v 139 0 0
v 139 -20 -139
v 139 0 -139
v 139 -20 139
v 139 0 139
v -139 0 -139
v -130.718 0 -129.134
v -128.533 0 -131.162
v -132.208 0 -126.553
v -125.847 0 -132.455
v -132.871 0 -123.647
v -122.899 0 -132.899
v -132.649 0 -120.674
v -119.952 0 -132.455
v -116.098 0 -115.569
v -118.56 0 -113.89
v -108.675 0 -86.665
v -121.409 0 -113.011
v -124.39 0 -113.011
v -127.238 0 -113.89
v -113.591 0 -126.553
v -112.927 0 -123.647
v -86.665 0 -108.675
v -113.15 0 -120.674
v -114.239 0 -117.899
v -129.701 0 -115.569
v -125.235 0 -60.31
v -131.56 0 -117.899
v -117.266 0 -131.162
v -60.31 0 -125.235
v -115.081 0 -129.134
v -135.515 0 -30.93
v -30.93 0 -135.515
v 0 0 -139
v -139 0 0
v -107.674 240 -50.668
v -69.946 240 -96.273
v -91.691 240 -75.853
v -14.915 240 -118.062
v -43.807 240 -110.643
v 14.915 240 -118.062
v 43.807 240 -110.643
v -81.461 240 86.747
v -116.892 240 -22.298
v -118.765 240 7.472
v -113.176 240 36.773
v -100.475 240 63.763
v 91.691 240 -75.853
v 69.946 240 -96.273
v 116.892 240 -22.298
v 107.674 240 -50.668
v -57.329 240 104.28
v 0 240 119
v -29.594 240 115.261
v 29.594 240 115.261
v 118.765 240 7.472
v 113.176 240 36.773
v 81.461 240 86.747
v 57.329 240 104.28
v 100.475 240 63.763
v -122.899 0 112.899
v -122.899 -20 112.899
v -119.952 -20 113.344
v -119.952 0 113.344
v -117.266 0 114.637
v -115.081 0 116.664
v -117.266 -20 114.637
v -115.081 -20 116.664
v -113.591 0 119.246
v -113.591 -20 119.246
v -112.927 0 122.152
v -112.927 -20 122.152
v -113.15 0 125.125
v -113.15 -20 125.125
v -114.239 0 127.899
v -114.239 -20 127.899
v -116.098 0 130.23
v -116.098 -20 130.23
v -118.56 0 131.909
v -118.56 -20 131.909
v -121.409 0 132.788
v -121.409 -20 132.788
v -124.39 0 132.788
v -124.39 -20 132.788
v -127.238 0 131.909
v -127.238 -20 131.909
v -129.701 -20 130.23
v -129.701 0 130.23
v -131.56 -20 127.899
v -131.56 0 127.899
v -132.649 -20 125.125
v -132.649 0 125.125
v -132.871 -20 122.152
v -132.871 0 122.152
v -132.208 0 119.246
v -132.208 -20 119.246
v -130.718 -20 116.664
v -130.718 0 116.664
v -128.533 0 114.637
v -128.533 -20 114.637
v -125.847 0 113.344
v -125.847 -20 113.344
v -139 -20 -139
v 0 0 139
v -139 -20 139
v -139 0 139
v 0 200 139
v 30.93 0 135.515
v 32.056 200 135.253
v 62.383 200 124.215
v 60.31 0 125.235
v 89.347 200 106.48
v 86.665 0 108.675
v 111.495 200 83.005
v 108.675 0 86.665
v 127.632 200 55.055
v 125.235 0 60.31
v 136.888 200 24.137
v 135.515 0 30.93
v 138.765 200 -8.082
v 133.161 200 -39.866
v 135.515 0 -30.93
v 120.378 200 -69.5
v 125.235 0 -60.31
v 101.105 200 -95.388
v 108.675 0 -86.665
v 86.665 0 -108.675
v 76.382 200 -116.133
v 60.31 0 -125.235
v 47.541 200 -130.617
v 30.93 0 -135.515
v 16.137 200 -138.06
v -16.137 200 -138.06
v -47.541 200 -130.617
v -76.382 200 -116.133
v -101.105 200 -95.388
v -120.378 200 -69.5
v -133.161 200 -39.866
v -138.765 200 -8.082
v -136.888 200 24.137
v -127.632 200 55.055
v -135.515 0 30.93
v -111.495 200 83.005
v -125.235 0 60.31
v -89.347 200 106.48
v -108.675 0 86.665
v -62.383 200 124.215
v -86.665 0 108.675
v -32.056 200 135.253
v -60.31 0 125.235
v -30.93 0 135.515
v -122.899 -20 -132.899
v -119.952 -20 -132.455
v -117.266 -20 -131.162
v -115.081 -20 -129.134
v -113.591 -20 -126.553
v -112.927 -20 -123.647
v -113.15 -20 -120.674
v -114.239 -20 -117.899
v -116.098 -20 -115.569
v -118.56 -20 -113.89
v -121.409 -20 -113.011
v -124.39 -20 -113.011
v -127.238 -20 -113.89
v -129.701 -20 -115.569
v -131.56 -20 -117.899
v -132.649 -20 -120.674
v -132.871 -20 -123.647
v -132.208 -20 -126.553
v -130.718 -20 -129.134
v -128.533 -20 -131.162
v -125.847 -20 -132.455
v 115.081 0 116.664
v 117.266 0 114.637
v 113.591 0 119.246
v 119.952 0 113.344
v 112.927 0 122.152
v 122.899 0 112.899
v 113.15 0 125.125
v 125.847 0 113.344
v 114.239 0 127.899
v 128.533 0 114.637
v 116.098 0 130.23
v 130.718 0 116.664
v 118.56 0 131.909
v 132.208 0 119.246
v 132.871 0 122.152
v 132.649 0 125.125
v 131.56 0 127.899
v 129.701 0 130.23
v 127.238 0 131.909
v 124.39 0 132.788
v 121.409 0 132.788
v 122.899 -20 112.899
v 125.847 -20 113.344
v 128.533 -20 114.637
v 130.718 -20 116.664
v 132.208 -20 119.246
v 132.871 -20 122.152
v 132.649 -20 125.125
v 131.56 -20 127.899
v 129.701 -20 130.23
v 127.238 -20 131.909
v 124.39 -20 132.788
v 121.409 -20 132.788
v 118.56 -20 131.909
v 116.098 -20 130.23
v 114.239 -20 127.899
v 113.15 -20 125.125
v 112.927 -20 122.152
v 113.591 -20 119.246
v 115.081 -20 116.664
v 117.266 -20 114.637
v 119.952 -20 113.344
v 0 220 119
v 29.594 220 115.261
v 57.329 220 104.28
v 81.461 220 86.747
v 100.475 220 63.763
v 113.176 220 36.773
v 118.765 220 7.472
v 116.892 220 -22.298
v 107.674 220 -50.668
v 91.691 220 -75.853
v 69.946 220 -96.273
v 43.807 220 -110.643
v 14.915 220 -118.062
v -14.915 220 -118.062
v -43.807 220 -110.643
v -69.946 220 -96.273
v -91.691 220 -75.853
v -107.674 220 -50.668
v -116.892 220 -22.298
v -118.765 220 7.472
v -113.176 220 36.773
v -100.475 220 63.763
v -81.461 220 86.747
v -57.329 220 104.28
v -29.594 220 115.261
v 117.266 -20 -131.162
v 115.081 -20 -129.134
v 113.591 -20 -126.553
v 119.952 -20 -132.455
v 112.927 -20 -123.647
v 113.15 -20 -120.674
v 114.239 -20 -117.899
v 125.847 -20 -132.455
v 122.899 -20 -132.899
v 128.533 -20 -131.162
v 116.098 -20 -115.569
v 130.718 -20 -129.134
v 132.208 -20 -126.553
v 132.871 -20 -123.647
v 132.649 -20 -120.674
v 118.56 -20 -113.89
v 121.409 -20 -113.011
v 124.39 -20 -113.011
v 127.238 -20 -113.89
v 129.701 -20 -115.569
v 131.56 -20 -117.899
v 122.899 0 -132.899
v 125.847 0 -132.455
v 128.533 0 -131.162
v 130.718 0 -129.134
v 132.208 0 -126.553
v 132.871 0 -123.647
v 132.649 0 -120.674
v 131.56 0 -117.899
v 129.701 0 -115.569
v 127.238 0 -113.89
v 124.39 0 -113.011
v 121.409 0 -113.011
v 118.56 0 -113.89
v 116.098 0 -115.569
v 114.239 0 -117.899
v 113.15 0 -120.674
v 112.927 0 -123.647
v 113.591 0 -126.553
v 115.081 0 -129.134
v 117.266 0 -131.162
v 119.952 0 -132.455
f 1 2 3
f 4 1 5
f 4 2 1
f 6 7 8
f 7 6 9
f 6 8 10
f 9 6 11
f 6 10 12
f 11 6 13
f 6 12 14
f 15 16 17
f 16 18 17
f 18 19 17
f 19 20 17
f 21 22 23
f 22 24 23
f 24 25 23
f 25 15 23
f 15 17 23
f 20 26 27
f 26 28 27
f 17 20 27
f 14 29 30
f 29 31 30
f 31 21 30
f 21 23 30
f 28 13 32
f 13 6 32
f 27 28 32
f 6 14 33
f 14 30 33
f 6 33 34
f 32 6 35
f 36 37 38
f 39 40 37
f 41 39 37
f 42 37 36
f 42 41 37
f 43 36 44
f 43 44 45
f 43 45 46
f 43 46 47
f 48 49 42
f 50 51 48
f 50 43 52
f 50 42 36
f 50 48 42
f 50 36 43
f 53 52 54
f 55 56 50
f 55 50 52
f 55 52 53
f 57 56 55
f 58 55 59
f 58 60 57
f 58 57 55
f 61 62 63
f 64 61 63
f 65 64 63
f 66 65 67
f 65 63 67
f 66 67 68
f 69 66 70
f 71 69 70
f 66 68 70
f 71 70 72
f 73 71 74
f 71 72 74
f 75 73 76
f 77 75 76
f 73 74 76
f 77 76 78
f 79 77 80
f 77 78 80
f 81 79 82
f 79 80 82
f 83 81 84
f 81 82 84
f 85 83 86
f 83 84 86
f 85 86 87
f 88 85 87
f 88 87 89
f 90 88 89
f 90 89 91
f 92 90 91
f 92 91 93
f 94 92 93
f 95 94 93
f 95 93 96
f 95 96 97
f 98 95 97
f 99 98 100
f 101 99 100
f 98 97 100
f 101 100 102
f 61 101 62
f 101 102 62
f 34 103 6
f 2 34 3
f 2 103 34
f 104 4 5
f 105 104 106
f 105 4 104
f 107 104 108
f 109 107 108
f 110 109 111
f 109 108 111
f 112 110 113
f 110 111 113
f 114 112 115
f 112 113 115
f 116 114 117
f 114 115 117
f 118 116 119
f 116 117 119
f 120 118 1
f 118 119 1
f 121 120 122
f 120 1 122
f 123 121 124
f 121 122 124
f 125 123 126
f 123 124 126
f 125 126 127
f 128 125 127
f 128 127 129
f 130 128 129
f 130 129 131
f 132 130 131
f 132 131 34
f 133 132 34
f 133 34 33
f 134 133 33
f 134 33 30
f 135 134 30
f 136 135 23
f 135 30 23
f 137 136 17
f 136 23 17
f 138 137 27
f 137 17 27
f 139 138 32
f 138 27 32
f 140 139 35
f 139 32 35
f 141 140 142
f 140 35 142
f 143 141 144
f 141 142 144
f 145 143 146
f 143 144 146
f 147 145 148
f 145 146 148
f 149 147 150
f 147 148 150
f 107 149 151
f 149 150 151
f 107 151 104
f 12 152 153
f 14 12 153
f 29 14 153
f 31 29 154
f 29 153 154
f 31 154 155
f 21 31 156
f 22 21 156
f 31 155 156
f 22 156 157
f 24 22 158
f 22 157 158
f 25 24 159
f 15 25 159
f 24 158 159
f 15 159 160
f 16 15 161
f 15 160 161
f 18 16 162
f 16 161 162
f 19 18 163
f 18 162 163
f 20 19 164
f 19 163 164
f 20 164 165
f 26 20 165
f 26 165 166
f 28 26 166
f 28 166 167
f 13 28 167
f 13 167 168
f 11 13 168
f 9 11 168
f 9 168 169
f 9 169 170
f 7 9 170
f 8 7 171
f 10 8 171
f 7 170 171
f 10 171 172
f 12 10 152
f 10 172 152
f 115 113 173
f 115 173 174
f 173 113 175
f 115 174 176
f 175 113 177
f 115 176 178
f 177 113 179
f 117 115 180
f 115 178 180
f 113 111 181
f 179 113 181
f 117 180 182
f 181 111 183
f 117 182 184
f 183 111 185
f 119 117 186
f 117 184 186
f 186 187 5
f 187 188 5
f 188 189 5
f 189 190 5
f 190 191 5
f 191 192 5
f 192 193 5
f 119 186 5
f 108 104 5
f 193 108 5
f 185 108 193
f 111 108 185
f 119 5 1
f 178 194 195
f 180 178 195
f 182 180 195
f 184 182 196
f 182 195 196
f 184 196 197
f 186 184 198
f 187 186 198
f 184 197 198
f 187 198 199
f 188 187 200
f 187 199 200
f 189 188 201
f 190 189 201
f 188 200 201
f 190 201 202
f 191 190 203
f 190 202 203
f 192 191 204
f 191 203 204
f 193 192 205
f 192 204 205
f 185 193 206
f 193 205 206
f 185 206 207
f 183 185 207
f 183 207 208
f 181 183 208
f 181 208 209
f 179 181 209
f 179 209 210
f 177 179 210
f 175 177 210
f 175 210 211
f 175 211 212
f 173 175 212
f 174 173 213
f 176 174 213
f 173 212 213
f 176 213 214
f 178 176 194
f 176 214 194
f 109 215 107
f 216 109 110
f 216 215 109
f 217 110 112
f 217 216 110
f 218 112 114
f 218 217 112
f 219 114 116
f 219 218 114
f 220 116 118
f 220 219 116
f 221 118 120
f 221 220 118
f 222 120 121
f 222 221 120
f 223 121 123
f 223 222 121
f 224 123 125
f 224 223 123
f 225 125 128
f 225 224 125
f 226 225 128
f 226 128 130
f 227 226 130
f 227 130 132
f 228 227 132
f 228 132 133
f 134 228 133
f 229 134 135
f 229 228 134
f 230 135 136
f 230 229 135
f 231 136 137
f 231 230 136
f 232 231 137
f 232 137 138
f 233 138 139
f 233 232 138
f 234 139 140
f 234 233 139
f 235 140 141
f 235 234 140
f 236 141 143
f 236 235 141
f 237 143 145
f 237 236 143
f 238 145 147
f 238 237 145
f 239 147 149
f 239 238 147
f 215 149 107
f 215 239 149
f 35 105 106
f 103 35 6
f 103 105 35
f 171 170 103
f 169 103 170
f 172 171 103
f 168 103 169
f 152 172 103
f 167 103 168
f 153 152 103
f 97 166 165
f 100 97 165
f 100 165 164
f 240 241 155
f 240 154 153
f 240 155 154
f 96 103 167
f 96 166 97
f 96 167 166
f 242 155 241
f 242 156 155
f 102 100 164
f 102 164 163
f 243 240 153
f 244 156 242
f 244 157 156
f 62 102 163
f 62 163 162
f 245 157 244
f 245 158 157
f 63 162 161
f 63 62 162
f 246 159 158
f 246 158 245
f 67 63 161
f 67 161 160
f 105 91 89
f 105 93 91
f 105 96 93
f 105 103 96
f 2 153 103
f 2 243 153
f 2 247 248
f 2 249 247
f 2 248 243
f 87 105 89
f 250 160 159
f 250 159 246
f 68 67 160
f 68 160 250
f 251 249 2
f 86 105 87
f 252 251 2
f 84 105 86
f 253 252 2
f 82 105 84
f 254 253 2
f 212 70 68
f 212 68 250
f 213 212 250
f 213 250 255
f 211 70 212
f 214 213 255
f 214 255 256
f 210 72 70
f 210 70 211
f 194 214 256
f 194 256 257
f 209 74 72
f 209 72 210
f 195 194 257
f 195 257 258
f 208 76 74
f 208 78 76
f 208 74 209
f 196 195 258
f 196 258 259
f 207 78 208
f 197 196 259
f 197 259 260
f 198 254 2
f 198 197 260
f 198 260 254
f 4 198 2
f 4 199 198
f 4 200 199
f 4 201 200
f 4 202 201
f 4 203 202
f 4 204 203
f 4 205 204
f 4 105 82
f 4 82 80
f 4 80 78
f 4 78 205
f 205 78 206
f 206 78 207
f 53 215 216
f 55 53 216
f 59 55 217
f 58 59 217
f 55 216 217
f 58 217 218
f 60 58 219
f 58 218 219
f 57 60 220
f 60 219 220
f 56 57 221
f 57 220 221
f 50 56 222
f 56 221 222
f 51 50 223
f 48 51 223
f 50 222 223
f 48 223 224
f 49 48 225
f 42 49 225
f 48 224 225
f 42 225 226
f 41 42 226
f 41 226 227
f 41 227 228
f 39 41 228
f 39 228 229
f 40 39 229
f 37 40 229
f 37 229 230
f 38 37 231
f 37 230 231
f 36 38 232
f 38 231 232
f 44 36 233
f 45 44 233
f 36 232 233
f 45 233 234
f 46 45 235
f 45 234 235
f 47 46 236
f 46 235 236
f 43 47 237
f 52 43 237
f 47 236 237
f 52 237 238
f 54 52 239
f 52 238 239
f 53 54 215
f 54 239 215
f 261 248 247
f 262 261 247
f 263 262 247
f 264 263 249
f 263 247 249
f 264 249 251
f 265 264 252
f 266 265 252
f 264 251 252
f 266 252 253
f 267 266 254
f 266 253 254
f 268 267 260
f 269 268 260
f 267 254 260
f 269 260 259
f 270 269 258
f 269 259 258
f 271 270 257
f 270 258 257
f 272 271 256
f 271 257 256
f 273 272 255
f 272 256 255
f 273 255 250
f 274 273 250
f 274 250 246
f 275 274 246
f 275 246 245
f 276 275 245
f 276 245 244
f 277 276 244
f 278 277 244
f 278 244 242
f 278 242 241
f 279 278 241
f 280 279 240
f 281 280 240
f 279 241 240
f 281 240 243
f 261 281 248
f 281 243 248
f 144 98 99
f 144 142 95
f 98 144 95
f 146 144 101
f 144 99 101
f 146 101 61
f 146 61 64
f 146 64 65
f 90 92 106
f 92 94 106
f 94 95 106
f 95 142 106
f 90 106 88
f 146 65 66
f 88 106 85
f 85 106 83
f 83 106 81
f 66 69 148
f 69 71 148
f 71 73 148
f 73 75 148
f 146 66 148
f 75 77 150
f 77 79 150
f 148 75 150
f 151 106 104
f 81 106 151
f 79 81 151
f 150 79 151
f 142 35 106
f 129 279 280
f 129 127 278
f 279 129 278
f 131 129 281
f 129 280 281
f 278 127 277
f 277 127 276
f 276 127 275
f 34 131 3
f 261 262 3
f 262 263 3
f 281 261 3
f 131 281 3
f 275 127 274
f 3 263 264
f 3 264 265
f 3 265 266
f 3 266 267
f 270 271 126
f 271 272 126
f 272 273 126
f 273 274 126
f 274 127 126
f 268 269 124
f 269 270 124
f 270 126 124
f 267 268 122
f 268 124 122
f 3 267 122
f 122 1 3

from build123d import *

# Parameters (mm, degrees)
SKETCH1_R           = 139
BOSS_EXTRUDE5_DEPTH = 220
CHAMFER6_SIZE       = 20
SKETCH9_R           = 119
BOSS_EXTRUDE6_DEPTH = 20
BOSS_EXTRUDE7_START = 20
SKETCH10_R          = 10
BOSS_EXTRUDE7_DEPTH = 20


with BuildPart() as part:
    # Sketch1 → Boss-Extrude5 (new body)
    with BuildSketch(Plane(origin=(0, 0, 0), x_dir=(1, 0, 0), z_dir=(0, 1, 0))):
        with Locations(Location((0, 0, 0), (0, 0, 270))):
            Circle(SKETCH1_R)
    extrude(amount=BOSS_EXTRUDE5_DEPTH)

    # Chamfer6
    chamfer6_edges = [part.edges().sort_by_distance(p)[0] for p in [
        (0, 220, -139),
    ]]
    chamfer(chamfer6_edges, length=CHAMFER6_SIZE)

    # Sketch9 → Boss-Extrude6 (add)
    with BuildSketch(Plane(origin=(0, 220, 0), x_dir=(1, 0, 0), z_dir=(0, 1, 0))):
        with Locations(Location((0, 0, 0), (0, 0, 270))):
            Circle(SKETCH9_R)
    extrude(amount=BOSS_EXTRUDE6_DEPTH)

    # Sketch10 → Boss-Extrude7 (add)
    # profile 1 of 20: a face of its own
    with BuildSketch(Plane.XZ.offset(BOSS_EXTRUDE7_START)):
        with BuildLine():
            ThreePointArc((-139, 0), (-98.287842585, 98.287842585), (0, 139))
            Line((0, 139), (-139, 139))
            Line((-139, 139), (-139, 0))
        make_face()
        with Locations(Location((-122.899316497, 122.899316497, 0), (0, 0, 270))):
            Circle(SKETCH10_R, mode=Mode.SUBTRACT)
    # profile 2 of 20: a face of its own
    with BuildSketch(Plane.XZ.offset(BOSS_EXTRUDE7_START)):
        with BuildLine():
            Line((139, 139), (0, 139))
            ThreePointArc((0, 139), (98.287842585, 98.287842585), (139, 0))
            Line((139, 0), (139, 139))
        make_face()
        with Locations(Location((122.899316497, 122.899316497, 0), (0, 0, 270))):
            Circle(SKETCH10_R, mode=Mode.SUBTRACT)
    # profile 3 of 20: a face of its own
    with BuildSketch(Plane.XZ.offset(BOSS_EXTRUDE7_START)):
        with BuildLine():
            Line((139, -139), (139, 0))
            ThreePointArc((139, 0), (98.287842585, -98.287842585), (0, -139))
            Line((0, -139), (139, -139))
        make_face()
        with Locations(Location((122.899316497, -122.899316497, 0), (0, 0, 270))):
            Circle(SKETCH10_R, mode=Mode.SUBTRACT)
    # profile 4 of 20: a face of its own
    with BuildSketch(Plane.XZ.offset(BOSS_EXTRUDE7_START)):
        with BuildLine():
            ThreePointArc((0, -139), (-98.287842585, -98.287842585), (-139, 0))
            Line((-139, 0), (-139, -139))
            Line((-139, -139), (0, -139))
        make_face()
        with Locations(Location((-122.899316497, -122.899316497, 0), (0, 0, 270))):
            Circle(SKETCH10_R, mode=Mode.SUBTRACT)
    # profile 5 of 20: a face of its own
    with BuildSketch(Plane.XZ.offset(BOSS_EXTRUDE7_START)):
        with BuildLine():
            ThreePointArc((139, 0), (98.287842585, 98.287842585), (0, 139))
            Line((0, 139), (0, 0))
            Line((0, 0), (139, 0))
        make_face()
    # profile 6 of 20: a face of its own
    with BuildSketch(Plane.XZ.offset(BOSS_EXTRUDE7_START)):
        with BuildLine():
            Line((0, 0), (0, 139))
            ThreePointArc((0, 139), (-98.287842585, 98.287842585), (-139, 0))
            Line((-139, 0), (0, 0))
        make_face()
    # profile 7 of 20: a face of its own
    with BuildSketch(Plane.XZ.offset(BOSS_EXTRUDE7_START)):
        with BuildLine():
            Line((139, 0), (0, 0))
            Line((0, 0), (0, -139))
            ThreePointArc((0, -139), (98.287842585, -98.287842585), (139, 0))
        make_face()
    # profile 8 of 20: a face of its own
    with BuildSketch(Plane.XZ.offset(BOSS_EXTRUDE7_START)):
        with BuildLine():
            Line((0, -139), (0, 0))
            Line((0, 0), (-139, 0))
            ThreePointArc((-139, 0), (-98.287842585, -98.287842585), (0, -139))
        make_face()
    # profile 9 of 20: a face of its own
    with BuildSketch(Plane.XZ.offset(BOSS_EXTRUDE7_START)):
        with BuildLine():
            ThreePointArc((139, 0), (98.287842585, 98.287842585), (0, 139))
            Line((0, 139), (0, 0))
            Line((0, 0), (139, 0))
        make_face()
    # profile 10 of 20: a face of its own
    with BuildSketch(Plane.XZ.offset(BOSS_EXTRUDE7_START)):
        with BuildLine():
            Line((0, 0), (0, 139))
            ThreePointArc((0, 139), (-98.287842585, 98.287842585), (-139, 0))
            Line((-139, 0), (0, 0))
        make_face()
    # profile 11 of 20: a face of its own
    with BuildSketch(Plane.XZ.offset(BOSS_EXTRUDE7_START)):
        with BuildLine():
            Line((139, 0), (0, 0))
            Line((0, 0), (0, -139))
            ThreePointArc((0, -139), (98.287842585, -98.287842585), (139, 0))
        make_face()
    # profile 12 of 20: a face of its own
    with BuildSketch(Plane.XZ.offset(BOSS_EXTRUDE7_START)):
        with BuildLine():
            Line((0, -139), (0, 0))
            Line((0, 0), (-139, 0))
            ThreePointArc((-139, 0), (-98.287842585, -98.287842585), (0, -139))
        make_face()
    # profile 13 of 20: a face of its own
    with BuildSketch(Plane.XZ.offset(BOSS_EXTRUDE7_START)):
        with BuildLine():
            ThreePointArc((139, 0), (98.287842585, 98.287842585), (0, 139))
            Line((0, 139), (0, 0))
            Line((0, 0), (139, 0))
        make_face()
    # profile 14 of 20: a face of its own
    with BuildSketch(Plane.XZ.offset(BOSS_EXTRUDE7_START)):
        with BuildLine():
            Line((0, 0), (0, 139))
            ThreePointArc((0, 139), (-98.287842585, 98.287842585), (-139, 0))
            Line((-139, 0), (0, 0))
        make_face()
    # profile 15 of 20: a face of its own
    with BuildSketch(Plane.XZ.offset(BOSS_EXTRUDE7_START)):
        with BuildLine():
            Line((139, 0), (0, 0))
            Line((0, 0), (0, -139))
            ThreePointArc((0, -139), (98.287842585, -98.287842585), (139, 0))
        make_face()
    # profile 16 of 20: a face of its own
    with BuildSketch(Plane.XZ.offset(BOSS_EXTRUDE7_START)):
        with BuildLine():
            Line((0, -139), (0, 0))
            Line((0, 0), (-139, 0))
            ThreePointArc((-139, 0), (-98.287842585, -98.287842585), (0, -139))
        make_face()
    # profile 17 of 20: a face of its own
    with BuildSketch(Plane.XZ.offset(BOSS_EXTRUDE7_START)):
        with BuildLine():
            ThreePointArc((139, 0), (98.287842585, 98.287842585), (0, 139))
            Line((0, 139), (0, 0))
            Line((0, 0), (139, 0))
        make_face()
    # profile 18 of 20: a face of its own
    with BuildSketch(Plane.XZ.offset(BOSS_EXTRUDE7_START)):
        with BuildLine():
            Line((0, 0), (0, 139))
            ThreePointArc((0, 139), (-98.287842585, 98.287842585), (-139, 0))
            Line((-139, 0), (0, 0))
        make_face()
    # profile 19 of 20: a face of its own
    with BuildSketch(Plane.XZ.offset(BOSS_EXTRUDE7_START)):
        with BuildLine():
            Line((139, 0), (0, 0))
            Line((0, 0), (0, -139))
            ThreePointArc((0, -139), (98.287842585, -98.287842585), (139, 0))
        make_face()
    # profile 20 of 20: a face of its own
    with BuildSketch(Plane.XZ.offset(BOSS_EXTRUDE7_START)):
        with BuildLine():
            Line((0, -139), (0, 0))
            Line((0, 0), (-139, 0))
            ThreePointArc((-139, 0), (-98.287842585, -98.287842585), (0, -139))
        make_face()
    extrude(amount=-BOSS_EXTRUDE7_DEPTH)


solid = part.part
